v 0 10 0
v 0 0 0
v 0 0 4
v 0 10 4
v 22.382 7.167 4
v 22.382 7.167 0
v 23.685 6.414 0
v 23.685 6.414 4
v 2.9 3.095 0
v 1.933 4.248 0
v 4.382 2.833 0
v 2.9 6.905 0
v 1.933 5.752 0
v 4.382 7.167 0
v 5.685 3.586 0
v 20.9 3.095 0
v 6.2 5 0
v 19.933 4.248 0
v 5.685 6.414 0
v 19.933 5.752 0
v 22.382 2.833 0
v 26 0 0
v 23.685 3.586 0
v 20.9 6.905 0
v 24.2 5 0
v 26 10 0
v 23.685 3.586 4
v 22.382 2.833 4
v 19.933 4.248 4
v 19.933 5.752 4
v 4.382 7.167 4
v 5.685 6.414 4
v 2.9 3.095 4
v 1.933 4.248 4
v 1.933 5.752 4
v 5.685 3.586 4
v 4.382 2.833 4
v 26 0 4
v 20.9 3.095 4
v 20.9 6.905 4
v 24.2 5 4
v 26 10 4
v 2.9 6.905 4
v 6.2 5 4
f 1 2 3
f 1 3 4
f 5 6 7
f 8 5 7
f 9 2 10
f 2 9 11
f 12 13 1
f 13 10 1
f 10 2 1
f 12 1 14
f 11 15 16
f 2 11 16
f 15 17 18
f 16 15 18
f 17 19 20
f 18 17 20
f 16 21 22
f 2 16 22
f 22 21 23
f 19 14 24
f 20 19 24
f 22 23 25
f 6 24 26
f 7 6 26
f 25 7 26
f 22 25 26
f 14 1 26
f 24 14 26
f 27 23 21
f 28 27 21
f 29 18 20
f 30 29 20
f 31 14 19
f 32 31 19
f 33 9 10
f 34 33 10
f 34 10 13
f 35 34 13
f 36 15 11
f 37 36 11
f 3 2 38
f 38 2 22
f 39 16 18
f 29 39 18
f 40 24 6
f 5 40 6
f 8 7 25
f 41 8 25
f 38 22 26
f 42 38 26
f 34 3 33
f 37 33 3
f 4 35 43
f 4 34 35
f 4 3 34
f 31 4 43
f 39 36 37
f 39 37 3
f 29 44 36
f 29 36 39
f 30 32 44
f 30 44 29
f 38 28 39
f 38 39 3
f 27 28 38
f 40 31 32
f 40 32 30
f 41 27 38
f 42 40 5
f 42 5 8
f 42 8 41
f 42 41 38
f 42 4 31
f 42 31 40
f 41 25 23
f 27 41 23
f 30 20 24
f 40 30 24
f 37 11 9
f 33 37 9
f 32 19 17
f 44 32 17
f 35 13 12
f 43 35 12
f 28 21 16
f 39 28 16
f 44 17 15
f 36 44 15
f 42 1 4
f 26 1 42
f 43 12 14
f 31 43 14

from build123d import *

# Parameters (mm, degrees)
SKETCH1_W           = 26
SKETCH1_H           = 10
BOSS_EXTRUDE1_DEPTH = 4


with BuildPart() as part:
    # Sketch1 → Boss-Extrude1 (new body)
    with BuildSketch(Plane.XY):
        with Locations((13, 5)):
            Rectangle(SKETCH1_W, SKETCH1_H)
        Polygon((2.899999851, 6.905256103), (4.382026, 7.166577107), (5.68529807, 6.414133033), (6.200000003, 5.000000051), (5.68529807, 3.585867069), (4.382026, 2.833422995), (2.899999851, 3.094743999), (1.932676008, 4.247555672), (1.932676008, 5.75244443), align=None, mode=Mode.SUBTRACT)
        Polygon((20.899999848, 6.905256103), (22.382025996, 7.166577107), (23.685298066, 6.414133033), (24.2, 5.000000051), (23.685298066, 3.585867069), (22.382025996, 2.833422995), (20.899999848, 3.094743999), (19.932676005, 4.247555672), (19.932676005, 5.75244443), align=None, mode=Mode.SUBTRACT)
    extrude(amount=BOSS_EXTRUDE1_DEPTH)


solid = part.part
